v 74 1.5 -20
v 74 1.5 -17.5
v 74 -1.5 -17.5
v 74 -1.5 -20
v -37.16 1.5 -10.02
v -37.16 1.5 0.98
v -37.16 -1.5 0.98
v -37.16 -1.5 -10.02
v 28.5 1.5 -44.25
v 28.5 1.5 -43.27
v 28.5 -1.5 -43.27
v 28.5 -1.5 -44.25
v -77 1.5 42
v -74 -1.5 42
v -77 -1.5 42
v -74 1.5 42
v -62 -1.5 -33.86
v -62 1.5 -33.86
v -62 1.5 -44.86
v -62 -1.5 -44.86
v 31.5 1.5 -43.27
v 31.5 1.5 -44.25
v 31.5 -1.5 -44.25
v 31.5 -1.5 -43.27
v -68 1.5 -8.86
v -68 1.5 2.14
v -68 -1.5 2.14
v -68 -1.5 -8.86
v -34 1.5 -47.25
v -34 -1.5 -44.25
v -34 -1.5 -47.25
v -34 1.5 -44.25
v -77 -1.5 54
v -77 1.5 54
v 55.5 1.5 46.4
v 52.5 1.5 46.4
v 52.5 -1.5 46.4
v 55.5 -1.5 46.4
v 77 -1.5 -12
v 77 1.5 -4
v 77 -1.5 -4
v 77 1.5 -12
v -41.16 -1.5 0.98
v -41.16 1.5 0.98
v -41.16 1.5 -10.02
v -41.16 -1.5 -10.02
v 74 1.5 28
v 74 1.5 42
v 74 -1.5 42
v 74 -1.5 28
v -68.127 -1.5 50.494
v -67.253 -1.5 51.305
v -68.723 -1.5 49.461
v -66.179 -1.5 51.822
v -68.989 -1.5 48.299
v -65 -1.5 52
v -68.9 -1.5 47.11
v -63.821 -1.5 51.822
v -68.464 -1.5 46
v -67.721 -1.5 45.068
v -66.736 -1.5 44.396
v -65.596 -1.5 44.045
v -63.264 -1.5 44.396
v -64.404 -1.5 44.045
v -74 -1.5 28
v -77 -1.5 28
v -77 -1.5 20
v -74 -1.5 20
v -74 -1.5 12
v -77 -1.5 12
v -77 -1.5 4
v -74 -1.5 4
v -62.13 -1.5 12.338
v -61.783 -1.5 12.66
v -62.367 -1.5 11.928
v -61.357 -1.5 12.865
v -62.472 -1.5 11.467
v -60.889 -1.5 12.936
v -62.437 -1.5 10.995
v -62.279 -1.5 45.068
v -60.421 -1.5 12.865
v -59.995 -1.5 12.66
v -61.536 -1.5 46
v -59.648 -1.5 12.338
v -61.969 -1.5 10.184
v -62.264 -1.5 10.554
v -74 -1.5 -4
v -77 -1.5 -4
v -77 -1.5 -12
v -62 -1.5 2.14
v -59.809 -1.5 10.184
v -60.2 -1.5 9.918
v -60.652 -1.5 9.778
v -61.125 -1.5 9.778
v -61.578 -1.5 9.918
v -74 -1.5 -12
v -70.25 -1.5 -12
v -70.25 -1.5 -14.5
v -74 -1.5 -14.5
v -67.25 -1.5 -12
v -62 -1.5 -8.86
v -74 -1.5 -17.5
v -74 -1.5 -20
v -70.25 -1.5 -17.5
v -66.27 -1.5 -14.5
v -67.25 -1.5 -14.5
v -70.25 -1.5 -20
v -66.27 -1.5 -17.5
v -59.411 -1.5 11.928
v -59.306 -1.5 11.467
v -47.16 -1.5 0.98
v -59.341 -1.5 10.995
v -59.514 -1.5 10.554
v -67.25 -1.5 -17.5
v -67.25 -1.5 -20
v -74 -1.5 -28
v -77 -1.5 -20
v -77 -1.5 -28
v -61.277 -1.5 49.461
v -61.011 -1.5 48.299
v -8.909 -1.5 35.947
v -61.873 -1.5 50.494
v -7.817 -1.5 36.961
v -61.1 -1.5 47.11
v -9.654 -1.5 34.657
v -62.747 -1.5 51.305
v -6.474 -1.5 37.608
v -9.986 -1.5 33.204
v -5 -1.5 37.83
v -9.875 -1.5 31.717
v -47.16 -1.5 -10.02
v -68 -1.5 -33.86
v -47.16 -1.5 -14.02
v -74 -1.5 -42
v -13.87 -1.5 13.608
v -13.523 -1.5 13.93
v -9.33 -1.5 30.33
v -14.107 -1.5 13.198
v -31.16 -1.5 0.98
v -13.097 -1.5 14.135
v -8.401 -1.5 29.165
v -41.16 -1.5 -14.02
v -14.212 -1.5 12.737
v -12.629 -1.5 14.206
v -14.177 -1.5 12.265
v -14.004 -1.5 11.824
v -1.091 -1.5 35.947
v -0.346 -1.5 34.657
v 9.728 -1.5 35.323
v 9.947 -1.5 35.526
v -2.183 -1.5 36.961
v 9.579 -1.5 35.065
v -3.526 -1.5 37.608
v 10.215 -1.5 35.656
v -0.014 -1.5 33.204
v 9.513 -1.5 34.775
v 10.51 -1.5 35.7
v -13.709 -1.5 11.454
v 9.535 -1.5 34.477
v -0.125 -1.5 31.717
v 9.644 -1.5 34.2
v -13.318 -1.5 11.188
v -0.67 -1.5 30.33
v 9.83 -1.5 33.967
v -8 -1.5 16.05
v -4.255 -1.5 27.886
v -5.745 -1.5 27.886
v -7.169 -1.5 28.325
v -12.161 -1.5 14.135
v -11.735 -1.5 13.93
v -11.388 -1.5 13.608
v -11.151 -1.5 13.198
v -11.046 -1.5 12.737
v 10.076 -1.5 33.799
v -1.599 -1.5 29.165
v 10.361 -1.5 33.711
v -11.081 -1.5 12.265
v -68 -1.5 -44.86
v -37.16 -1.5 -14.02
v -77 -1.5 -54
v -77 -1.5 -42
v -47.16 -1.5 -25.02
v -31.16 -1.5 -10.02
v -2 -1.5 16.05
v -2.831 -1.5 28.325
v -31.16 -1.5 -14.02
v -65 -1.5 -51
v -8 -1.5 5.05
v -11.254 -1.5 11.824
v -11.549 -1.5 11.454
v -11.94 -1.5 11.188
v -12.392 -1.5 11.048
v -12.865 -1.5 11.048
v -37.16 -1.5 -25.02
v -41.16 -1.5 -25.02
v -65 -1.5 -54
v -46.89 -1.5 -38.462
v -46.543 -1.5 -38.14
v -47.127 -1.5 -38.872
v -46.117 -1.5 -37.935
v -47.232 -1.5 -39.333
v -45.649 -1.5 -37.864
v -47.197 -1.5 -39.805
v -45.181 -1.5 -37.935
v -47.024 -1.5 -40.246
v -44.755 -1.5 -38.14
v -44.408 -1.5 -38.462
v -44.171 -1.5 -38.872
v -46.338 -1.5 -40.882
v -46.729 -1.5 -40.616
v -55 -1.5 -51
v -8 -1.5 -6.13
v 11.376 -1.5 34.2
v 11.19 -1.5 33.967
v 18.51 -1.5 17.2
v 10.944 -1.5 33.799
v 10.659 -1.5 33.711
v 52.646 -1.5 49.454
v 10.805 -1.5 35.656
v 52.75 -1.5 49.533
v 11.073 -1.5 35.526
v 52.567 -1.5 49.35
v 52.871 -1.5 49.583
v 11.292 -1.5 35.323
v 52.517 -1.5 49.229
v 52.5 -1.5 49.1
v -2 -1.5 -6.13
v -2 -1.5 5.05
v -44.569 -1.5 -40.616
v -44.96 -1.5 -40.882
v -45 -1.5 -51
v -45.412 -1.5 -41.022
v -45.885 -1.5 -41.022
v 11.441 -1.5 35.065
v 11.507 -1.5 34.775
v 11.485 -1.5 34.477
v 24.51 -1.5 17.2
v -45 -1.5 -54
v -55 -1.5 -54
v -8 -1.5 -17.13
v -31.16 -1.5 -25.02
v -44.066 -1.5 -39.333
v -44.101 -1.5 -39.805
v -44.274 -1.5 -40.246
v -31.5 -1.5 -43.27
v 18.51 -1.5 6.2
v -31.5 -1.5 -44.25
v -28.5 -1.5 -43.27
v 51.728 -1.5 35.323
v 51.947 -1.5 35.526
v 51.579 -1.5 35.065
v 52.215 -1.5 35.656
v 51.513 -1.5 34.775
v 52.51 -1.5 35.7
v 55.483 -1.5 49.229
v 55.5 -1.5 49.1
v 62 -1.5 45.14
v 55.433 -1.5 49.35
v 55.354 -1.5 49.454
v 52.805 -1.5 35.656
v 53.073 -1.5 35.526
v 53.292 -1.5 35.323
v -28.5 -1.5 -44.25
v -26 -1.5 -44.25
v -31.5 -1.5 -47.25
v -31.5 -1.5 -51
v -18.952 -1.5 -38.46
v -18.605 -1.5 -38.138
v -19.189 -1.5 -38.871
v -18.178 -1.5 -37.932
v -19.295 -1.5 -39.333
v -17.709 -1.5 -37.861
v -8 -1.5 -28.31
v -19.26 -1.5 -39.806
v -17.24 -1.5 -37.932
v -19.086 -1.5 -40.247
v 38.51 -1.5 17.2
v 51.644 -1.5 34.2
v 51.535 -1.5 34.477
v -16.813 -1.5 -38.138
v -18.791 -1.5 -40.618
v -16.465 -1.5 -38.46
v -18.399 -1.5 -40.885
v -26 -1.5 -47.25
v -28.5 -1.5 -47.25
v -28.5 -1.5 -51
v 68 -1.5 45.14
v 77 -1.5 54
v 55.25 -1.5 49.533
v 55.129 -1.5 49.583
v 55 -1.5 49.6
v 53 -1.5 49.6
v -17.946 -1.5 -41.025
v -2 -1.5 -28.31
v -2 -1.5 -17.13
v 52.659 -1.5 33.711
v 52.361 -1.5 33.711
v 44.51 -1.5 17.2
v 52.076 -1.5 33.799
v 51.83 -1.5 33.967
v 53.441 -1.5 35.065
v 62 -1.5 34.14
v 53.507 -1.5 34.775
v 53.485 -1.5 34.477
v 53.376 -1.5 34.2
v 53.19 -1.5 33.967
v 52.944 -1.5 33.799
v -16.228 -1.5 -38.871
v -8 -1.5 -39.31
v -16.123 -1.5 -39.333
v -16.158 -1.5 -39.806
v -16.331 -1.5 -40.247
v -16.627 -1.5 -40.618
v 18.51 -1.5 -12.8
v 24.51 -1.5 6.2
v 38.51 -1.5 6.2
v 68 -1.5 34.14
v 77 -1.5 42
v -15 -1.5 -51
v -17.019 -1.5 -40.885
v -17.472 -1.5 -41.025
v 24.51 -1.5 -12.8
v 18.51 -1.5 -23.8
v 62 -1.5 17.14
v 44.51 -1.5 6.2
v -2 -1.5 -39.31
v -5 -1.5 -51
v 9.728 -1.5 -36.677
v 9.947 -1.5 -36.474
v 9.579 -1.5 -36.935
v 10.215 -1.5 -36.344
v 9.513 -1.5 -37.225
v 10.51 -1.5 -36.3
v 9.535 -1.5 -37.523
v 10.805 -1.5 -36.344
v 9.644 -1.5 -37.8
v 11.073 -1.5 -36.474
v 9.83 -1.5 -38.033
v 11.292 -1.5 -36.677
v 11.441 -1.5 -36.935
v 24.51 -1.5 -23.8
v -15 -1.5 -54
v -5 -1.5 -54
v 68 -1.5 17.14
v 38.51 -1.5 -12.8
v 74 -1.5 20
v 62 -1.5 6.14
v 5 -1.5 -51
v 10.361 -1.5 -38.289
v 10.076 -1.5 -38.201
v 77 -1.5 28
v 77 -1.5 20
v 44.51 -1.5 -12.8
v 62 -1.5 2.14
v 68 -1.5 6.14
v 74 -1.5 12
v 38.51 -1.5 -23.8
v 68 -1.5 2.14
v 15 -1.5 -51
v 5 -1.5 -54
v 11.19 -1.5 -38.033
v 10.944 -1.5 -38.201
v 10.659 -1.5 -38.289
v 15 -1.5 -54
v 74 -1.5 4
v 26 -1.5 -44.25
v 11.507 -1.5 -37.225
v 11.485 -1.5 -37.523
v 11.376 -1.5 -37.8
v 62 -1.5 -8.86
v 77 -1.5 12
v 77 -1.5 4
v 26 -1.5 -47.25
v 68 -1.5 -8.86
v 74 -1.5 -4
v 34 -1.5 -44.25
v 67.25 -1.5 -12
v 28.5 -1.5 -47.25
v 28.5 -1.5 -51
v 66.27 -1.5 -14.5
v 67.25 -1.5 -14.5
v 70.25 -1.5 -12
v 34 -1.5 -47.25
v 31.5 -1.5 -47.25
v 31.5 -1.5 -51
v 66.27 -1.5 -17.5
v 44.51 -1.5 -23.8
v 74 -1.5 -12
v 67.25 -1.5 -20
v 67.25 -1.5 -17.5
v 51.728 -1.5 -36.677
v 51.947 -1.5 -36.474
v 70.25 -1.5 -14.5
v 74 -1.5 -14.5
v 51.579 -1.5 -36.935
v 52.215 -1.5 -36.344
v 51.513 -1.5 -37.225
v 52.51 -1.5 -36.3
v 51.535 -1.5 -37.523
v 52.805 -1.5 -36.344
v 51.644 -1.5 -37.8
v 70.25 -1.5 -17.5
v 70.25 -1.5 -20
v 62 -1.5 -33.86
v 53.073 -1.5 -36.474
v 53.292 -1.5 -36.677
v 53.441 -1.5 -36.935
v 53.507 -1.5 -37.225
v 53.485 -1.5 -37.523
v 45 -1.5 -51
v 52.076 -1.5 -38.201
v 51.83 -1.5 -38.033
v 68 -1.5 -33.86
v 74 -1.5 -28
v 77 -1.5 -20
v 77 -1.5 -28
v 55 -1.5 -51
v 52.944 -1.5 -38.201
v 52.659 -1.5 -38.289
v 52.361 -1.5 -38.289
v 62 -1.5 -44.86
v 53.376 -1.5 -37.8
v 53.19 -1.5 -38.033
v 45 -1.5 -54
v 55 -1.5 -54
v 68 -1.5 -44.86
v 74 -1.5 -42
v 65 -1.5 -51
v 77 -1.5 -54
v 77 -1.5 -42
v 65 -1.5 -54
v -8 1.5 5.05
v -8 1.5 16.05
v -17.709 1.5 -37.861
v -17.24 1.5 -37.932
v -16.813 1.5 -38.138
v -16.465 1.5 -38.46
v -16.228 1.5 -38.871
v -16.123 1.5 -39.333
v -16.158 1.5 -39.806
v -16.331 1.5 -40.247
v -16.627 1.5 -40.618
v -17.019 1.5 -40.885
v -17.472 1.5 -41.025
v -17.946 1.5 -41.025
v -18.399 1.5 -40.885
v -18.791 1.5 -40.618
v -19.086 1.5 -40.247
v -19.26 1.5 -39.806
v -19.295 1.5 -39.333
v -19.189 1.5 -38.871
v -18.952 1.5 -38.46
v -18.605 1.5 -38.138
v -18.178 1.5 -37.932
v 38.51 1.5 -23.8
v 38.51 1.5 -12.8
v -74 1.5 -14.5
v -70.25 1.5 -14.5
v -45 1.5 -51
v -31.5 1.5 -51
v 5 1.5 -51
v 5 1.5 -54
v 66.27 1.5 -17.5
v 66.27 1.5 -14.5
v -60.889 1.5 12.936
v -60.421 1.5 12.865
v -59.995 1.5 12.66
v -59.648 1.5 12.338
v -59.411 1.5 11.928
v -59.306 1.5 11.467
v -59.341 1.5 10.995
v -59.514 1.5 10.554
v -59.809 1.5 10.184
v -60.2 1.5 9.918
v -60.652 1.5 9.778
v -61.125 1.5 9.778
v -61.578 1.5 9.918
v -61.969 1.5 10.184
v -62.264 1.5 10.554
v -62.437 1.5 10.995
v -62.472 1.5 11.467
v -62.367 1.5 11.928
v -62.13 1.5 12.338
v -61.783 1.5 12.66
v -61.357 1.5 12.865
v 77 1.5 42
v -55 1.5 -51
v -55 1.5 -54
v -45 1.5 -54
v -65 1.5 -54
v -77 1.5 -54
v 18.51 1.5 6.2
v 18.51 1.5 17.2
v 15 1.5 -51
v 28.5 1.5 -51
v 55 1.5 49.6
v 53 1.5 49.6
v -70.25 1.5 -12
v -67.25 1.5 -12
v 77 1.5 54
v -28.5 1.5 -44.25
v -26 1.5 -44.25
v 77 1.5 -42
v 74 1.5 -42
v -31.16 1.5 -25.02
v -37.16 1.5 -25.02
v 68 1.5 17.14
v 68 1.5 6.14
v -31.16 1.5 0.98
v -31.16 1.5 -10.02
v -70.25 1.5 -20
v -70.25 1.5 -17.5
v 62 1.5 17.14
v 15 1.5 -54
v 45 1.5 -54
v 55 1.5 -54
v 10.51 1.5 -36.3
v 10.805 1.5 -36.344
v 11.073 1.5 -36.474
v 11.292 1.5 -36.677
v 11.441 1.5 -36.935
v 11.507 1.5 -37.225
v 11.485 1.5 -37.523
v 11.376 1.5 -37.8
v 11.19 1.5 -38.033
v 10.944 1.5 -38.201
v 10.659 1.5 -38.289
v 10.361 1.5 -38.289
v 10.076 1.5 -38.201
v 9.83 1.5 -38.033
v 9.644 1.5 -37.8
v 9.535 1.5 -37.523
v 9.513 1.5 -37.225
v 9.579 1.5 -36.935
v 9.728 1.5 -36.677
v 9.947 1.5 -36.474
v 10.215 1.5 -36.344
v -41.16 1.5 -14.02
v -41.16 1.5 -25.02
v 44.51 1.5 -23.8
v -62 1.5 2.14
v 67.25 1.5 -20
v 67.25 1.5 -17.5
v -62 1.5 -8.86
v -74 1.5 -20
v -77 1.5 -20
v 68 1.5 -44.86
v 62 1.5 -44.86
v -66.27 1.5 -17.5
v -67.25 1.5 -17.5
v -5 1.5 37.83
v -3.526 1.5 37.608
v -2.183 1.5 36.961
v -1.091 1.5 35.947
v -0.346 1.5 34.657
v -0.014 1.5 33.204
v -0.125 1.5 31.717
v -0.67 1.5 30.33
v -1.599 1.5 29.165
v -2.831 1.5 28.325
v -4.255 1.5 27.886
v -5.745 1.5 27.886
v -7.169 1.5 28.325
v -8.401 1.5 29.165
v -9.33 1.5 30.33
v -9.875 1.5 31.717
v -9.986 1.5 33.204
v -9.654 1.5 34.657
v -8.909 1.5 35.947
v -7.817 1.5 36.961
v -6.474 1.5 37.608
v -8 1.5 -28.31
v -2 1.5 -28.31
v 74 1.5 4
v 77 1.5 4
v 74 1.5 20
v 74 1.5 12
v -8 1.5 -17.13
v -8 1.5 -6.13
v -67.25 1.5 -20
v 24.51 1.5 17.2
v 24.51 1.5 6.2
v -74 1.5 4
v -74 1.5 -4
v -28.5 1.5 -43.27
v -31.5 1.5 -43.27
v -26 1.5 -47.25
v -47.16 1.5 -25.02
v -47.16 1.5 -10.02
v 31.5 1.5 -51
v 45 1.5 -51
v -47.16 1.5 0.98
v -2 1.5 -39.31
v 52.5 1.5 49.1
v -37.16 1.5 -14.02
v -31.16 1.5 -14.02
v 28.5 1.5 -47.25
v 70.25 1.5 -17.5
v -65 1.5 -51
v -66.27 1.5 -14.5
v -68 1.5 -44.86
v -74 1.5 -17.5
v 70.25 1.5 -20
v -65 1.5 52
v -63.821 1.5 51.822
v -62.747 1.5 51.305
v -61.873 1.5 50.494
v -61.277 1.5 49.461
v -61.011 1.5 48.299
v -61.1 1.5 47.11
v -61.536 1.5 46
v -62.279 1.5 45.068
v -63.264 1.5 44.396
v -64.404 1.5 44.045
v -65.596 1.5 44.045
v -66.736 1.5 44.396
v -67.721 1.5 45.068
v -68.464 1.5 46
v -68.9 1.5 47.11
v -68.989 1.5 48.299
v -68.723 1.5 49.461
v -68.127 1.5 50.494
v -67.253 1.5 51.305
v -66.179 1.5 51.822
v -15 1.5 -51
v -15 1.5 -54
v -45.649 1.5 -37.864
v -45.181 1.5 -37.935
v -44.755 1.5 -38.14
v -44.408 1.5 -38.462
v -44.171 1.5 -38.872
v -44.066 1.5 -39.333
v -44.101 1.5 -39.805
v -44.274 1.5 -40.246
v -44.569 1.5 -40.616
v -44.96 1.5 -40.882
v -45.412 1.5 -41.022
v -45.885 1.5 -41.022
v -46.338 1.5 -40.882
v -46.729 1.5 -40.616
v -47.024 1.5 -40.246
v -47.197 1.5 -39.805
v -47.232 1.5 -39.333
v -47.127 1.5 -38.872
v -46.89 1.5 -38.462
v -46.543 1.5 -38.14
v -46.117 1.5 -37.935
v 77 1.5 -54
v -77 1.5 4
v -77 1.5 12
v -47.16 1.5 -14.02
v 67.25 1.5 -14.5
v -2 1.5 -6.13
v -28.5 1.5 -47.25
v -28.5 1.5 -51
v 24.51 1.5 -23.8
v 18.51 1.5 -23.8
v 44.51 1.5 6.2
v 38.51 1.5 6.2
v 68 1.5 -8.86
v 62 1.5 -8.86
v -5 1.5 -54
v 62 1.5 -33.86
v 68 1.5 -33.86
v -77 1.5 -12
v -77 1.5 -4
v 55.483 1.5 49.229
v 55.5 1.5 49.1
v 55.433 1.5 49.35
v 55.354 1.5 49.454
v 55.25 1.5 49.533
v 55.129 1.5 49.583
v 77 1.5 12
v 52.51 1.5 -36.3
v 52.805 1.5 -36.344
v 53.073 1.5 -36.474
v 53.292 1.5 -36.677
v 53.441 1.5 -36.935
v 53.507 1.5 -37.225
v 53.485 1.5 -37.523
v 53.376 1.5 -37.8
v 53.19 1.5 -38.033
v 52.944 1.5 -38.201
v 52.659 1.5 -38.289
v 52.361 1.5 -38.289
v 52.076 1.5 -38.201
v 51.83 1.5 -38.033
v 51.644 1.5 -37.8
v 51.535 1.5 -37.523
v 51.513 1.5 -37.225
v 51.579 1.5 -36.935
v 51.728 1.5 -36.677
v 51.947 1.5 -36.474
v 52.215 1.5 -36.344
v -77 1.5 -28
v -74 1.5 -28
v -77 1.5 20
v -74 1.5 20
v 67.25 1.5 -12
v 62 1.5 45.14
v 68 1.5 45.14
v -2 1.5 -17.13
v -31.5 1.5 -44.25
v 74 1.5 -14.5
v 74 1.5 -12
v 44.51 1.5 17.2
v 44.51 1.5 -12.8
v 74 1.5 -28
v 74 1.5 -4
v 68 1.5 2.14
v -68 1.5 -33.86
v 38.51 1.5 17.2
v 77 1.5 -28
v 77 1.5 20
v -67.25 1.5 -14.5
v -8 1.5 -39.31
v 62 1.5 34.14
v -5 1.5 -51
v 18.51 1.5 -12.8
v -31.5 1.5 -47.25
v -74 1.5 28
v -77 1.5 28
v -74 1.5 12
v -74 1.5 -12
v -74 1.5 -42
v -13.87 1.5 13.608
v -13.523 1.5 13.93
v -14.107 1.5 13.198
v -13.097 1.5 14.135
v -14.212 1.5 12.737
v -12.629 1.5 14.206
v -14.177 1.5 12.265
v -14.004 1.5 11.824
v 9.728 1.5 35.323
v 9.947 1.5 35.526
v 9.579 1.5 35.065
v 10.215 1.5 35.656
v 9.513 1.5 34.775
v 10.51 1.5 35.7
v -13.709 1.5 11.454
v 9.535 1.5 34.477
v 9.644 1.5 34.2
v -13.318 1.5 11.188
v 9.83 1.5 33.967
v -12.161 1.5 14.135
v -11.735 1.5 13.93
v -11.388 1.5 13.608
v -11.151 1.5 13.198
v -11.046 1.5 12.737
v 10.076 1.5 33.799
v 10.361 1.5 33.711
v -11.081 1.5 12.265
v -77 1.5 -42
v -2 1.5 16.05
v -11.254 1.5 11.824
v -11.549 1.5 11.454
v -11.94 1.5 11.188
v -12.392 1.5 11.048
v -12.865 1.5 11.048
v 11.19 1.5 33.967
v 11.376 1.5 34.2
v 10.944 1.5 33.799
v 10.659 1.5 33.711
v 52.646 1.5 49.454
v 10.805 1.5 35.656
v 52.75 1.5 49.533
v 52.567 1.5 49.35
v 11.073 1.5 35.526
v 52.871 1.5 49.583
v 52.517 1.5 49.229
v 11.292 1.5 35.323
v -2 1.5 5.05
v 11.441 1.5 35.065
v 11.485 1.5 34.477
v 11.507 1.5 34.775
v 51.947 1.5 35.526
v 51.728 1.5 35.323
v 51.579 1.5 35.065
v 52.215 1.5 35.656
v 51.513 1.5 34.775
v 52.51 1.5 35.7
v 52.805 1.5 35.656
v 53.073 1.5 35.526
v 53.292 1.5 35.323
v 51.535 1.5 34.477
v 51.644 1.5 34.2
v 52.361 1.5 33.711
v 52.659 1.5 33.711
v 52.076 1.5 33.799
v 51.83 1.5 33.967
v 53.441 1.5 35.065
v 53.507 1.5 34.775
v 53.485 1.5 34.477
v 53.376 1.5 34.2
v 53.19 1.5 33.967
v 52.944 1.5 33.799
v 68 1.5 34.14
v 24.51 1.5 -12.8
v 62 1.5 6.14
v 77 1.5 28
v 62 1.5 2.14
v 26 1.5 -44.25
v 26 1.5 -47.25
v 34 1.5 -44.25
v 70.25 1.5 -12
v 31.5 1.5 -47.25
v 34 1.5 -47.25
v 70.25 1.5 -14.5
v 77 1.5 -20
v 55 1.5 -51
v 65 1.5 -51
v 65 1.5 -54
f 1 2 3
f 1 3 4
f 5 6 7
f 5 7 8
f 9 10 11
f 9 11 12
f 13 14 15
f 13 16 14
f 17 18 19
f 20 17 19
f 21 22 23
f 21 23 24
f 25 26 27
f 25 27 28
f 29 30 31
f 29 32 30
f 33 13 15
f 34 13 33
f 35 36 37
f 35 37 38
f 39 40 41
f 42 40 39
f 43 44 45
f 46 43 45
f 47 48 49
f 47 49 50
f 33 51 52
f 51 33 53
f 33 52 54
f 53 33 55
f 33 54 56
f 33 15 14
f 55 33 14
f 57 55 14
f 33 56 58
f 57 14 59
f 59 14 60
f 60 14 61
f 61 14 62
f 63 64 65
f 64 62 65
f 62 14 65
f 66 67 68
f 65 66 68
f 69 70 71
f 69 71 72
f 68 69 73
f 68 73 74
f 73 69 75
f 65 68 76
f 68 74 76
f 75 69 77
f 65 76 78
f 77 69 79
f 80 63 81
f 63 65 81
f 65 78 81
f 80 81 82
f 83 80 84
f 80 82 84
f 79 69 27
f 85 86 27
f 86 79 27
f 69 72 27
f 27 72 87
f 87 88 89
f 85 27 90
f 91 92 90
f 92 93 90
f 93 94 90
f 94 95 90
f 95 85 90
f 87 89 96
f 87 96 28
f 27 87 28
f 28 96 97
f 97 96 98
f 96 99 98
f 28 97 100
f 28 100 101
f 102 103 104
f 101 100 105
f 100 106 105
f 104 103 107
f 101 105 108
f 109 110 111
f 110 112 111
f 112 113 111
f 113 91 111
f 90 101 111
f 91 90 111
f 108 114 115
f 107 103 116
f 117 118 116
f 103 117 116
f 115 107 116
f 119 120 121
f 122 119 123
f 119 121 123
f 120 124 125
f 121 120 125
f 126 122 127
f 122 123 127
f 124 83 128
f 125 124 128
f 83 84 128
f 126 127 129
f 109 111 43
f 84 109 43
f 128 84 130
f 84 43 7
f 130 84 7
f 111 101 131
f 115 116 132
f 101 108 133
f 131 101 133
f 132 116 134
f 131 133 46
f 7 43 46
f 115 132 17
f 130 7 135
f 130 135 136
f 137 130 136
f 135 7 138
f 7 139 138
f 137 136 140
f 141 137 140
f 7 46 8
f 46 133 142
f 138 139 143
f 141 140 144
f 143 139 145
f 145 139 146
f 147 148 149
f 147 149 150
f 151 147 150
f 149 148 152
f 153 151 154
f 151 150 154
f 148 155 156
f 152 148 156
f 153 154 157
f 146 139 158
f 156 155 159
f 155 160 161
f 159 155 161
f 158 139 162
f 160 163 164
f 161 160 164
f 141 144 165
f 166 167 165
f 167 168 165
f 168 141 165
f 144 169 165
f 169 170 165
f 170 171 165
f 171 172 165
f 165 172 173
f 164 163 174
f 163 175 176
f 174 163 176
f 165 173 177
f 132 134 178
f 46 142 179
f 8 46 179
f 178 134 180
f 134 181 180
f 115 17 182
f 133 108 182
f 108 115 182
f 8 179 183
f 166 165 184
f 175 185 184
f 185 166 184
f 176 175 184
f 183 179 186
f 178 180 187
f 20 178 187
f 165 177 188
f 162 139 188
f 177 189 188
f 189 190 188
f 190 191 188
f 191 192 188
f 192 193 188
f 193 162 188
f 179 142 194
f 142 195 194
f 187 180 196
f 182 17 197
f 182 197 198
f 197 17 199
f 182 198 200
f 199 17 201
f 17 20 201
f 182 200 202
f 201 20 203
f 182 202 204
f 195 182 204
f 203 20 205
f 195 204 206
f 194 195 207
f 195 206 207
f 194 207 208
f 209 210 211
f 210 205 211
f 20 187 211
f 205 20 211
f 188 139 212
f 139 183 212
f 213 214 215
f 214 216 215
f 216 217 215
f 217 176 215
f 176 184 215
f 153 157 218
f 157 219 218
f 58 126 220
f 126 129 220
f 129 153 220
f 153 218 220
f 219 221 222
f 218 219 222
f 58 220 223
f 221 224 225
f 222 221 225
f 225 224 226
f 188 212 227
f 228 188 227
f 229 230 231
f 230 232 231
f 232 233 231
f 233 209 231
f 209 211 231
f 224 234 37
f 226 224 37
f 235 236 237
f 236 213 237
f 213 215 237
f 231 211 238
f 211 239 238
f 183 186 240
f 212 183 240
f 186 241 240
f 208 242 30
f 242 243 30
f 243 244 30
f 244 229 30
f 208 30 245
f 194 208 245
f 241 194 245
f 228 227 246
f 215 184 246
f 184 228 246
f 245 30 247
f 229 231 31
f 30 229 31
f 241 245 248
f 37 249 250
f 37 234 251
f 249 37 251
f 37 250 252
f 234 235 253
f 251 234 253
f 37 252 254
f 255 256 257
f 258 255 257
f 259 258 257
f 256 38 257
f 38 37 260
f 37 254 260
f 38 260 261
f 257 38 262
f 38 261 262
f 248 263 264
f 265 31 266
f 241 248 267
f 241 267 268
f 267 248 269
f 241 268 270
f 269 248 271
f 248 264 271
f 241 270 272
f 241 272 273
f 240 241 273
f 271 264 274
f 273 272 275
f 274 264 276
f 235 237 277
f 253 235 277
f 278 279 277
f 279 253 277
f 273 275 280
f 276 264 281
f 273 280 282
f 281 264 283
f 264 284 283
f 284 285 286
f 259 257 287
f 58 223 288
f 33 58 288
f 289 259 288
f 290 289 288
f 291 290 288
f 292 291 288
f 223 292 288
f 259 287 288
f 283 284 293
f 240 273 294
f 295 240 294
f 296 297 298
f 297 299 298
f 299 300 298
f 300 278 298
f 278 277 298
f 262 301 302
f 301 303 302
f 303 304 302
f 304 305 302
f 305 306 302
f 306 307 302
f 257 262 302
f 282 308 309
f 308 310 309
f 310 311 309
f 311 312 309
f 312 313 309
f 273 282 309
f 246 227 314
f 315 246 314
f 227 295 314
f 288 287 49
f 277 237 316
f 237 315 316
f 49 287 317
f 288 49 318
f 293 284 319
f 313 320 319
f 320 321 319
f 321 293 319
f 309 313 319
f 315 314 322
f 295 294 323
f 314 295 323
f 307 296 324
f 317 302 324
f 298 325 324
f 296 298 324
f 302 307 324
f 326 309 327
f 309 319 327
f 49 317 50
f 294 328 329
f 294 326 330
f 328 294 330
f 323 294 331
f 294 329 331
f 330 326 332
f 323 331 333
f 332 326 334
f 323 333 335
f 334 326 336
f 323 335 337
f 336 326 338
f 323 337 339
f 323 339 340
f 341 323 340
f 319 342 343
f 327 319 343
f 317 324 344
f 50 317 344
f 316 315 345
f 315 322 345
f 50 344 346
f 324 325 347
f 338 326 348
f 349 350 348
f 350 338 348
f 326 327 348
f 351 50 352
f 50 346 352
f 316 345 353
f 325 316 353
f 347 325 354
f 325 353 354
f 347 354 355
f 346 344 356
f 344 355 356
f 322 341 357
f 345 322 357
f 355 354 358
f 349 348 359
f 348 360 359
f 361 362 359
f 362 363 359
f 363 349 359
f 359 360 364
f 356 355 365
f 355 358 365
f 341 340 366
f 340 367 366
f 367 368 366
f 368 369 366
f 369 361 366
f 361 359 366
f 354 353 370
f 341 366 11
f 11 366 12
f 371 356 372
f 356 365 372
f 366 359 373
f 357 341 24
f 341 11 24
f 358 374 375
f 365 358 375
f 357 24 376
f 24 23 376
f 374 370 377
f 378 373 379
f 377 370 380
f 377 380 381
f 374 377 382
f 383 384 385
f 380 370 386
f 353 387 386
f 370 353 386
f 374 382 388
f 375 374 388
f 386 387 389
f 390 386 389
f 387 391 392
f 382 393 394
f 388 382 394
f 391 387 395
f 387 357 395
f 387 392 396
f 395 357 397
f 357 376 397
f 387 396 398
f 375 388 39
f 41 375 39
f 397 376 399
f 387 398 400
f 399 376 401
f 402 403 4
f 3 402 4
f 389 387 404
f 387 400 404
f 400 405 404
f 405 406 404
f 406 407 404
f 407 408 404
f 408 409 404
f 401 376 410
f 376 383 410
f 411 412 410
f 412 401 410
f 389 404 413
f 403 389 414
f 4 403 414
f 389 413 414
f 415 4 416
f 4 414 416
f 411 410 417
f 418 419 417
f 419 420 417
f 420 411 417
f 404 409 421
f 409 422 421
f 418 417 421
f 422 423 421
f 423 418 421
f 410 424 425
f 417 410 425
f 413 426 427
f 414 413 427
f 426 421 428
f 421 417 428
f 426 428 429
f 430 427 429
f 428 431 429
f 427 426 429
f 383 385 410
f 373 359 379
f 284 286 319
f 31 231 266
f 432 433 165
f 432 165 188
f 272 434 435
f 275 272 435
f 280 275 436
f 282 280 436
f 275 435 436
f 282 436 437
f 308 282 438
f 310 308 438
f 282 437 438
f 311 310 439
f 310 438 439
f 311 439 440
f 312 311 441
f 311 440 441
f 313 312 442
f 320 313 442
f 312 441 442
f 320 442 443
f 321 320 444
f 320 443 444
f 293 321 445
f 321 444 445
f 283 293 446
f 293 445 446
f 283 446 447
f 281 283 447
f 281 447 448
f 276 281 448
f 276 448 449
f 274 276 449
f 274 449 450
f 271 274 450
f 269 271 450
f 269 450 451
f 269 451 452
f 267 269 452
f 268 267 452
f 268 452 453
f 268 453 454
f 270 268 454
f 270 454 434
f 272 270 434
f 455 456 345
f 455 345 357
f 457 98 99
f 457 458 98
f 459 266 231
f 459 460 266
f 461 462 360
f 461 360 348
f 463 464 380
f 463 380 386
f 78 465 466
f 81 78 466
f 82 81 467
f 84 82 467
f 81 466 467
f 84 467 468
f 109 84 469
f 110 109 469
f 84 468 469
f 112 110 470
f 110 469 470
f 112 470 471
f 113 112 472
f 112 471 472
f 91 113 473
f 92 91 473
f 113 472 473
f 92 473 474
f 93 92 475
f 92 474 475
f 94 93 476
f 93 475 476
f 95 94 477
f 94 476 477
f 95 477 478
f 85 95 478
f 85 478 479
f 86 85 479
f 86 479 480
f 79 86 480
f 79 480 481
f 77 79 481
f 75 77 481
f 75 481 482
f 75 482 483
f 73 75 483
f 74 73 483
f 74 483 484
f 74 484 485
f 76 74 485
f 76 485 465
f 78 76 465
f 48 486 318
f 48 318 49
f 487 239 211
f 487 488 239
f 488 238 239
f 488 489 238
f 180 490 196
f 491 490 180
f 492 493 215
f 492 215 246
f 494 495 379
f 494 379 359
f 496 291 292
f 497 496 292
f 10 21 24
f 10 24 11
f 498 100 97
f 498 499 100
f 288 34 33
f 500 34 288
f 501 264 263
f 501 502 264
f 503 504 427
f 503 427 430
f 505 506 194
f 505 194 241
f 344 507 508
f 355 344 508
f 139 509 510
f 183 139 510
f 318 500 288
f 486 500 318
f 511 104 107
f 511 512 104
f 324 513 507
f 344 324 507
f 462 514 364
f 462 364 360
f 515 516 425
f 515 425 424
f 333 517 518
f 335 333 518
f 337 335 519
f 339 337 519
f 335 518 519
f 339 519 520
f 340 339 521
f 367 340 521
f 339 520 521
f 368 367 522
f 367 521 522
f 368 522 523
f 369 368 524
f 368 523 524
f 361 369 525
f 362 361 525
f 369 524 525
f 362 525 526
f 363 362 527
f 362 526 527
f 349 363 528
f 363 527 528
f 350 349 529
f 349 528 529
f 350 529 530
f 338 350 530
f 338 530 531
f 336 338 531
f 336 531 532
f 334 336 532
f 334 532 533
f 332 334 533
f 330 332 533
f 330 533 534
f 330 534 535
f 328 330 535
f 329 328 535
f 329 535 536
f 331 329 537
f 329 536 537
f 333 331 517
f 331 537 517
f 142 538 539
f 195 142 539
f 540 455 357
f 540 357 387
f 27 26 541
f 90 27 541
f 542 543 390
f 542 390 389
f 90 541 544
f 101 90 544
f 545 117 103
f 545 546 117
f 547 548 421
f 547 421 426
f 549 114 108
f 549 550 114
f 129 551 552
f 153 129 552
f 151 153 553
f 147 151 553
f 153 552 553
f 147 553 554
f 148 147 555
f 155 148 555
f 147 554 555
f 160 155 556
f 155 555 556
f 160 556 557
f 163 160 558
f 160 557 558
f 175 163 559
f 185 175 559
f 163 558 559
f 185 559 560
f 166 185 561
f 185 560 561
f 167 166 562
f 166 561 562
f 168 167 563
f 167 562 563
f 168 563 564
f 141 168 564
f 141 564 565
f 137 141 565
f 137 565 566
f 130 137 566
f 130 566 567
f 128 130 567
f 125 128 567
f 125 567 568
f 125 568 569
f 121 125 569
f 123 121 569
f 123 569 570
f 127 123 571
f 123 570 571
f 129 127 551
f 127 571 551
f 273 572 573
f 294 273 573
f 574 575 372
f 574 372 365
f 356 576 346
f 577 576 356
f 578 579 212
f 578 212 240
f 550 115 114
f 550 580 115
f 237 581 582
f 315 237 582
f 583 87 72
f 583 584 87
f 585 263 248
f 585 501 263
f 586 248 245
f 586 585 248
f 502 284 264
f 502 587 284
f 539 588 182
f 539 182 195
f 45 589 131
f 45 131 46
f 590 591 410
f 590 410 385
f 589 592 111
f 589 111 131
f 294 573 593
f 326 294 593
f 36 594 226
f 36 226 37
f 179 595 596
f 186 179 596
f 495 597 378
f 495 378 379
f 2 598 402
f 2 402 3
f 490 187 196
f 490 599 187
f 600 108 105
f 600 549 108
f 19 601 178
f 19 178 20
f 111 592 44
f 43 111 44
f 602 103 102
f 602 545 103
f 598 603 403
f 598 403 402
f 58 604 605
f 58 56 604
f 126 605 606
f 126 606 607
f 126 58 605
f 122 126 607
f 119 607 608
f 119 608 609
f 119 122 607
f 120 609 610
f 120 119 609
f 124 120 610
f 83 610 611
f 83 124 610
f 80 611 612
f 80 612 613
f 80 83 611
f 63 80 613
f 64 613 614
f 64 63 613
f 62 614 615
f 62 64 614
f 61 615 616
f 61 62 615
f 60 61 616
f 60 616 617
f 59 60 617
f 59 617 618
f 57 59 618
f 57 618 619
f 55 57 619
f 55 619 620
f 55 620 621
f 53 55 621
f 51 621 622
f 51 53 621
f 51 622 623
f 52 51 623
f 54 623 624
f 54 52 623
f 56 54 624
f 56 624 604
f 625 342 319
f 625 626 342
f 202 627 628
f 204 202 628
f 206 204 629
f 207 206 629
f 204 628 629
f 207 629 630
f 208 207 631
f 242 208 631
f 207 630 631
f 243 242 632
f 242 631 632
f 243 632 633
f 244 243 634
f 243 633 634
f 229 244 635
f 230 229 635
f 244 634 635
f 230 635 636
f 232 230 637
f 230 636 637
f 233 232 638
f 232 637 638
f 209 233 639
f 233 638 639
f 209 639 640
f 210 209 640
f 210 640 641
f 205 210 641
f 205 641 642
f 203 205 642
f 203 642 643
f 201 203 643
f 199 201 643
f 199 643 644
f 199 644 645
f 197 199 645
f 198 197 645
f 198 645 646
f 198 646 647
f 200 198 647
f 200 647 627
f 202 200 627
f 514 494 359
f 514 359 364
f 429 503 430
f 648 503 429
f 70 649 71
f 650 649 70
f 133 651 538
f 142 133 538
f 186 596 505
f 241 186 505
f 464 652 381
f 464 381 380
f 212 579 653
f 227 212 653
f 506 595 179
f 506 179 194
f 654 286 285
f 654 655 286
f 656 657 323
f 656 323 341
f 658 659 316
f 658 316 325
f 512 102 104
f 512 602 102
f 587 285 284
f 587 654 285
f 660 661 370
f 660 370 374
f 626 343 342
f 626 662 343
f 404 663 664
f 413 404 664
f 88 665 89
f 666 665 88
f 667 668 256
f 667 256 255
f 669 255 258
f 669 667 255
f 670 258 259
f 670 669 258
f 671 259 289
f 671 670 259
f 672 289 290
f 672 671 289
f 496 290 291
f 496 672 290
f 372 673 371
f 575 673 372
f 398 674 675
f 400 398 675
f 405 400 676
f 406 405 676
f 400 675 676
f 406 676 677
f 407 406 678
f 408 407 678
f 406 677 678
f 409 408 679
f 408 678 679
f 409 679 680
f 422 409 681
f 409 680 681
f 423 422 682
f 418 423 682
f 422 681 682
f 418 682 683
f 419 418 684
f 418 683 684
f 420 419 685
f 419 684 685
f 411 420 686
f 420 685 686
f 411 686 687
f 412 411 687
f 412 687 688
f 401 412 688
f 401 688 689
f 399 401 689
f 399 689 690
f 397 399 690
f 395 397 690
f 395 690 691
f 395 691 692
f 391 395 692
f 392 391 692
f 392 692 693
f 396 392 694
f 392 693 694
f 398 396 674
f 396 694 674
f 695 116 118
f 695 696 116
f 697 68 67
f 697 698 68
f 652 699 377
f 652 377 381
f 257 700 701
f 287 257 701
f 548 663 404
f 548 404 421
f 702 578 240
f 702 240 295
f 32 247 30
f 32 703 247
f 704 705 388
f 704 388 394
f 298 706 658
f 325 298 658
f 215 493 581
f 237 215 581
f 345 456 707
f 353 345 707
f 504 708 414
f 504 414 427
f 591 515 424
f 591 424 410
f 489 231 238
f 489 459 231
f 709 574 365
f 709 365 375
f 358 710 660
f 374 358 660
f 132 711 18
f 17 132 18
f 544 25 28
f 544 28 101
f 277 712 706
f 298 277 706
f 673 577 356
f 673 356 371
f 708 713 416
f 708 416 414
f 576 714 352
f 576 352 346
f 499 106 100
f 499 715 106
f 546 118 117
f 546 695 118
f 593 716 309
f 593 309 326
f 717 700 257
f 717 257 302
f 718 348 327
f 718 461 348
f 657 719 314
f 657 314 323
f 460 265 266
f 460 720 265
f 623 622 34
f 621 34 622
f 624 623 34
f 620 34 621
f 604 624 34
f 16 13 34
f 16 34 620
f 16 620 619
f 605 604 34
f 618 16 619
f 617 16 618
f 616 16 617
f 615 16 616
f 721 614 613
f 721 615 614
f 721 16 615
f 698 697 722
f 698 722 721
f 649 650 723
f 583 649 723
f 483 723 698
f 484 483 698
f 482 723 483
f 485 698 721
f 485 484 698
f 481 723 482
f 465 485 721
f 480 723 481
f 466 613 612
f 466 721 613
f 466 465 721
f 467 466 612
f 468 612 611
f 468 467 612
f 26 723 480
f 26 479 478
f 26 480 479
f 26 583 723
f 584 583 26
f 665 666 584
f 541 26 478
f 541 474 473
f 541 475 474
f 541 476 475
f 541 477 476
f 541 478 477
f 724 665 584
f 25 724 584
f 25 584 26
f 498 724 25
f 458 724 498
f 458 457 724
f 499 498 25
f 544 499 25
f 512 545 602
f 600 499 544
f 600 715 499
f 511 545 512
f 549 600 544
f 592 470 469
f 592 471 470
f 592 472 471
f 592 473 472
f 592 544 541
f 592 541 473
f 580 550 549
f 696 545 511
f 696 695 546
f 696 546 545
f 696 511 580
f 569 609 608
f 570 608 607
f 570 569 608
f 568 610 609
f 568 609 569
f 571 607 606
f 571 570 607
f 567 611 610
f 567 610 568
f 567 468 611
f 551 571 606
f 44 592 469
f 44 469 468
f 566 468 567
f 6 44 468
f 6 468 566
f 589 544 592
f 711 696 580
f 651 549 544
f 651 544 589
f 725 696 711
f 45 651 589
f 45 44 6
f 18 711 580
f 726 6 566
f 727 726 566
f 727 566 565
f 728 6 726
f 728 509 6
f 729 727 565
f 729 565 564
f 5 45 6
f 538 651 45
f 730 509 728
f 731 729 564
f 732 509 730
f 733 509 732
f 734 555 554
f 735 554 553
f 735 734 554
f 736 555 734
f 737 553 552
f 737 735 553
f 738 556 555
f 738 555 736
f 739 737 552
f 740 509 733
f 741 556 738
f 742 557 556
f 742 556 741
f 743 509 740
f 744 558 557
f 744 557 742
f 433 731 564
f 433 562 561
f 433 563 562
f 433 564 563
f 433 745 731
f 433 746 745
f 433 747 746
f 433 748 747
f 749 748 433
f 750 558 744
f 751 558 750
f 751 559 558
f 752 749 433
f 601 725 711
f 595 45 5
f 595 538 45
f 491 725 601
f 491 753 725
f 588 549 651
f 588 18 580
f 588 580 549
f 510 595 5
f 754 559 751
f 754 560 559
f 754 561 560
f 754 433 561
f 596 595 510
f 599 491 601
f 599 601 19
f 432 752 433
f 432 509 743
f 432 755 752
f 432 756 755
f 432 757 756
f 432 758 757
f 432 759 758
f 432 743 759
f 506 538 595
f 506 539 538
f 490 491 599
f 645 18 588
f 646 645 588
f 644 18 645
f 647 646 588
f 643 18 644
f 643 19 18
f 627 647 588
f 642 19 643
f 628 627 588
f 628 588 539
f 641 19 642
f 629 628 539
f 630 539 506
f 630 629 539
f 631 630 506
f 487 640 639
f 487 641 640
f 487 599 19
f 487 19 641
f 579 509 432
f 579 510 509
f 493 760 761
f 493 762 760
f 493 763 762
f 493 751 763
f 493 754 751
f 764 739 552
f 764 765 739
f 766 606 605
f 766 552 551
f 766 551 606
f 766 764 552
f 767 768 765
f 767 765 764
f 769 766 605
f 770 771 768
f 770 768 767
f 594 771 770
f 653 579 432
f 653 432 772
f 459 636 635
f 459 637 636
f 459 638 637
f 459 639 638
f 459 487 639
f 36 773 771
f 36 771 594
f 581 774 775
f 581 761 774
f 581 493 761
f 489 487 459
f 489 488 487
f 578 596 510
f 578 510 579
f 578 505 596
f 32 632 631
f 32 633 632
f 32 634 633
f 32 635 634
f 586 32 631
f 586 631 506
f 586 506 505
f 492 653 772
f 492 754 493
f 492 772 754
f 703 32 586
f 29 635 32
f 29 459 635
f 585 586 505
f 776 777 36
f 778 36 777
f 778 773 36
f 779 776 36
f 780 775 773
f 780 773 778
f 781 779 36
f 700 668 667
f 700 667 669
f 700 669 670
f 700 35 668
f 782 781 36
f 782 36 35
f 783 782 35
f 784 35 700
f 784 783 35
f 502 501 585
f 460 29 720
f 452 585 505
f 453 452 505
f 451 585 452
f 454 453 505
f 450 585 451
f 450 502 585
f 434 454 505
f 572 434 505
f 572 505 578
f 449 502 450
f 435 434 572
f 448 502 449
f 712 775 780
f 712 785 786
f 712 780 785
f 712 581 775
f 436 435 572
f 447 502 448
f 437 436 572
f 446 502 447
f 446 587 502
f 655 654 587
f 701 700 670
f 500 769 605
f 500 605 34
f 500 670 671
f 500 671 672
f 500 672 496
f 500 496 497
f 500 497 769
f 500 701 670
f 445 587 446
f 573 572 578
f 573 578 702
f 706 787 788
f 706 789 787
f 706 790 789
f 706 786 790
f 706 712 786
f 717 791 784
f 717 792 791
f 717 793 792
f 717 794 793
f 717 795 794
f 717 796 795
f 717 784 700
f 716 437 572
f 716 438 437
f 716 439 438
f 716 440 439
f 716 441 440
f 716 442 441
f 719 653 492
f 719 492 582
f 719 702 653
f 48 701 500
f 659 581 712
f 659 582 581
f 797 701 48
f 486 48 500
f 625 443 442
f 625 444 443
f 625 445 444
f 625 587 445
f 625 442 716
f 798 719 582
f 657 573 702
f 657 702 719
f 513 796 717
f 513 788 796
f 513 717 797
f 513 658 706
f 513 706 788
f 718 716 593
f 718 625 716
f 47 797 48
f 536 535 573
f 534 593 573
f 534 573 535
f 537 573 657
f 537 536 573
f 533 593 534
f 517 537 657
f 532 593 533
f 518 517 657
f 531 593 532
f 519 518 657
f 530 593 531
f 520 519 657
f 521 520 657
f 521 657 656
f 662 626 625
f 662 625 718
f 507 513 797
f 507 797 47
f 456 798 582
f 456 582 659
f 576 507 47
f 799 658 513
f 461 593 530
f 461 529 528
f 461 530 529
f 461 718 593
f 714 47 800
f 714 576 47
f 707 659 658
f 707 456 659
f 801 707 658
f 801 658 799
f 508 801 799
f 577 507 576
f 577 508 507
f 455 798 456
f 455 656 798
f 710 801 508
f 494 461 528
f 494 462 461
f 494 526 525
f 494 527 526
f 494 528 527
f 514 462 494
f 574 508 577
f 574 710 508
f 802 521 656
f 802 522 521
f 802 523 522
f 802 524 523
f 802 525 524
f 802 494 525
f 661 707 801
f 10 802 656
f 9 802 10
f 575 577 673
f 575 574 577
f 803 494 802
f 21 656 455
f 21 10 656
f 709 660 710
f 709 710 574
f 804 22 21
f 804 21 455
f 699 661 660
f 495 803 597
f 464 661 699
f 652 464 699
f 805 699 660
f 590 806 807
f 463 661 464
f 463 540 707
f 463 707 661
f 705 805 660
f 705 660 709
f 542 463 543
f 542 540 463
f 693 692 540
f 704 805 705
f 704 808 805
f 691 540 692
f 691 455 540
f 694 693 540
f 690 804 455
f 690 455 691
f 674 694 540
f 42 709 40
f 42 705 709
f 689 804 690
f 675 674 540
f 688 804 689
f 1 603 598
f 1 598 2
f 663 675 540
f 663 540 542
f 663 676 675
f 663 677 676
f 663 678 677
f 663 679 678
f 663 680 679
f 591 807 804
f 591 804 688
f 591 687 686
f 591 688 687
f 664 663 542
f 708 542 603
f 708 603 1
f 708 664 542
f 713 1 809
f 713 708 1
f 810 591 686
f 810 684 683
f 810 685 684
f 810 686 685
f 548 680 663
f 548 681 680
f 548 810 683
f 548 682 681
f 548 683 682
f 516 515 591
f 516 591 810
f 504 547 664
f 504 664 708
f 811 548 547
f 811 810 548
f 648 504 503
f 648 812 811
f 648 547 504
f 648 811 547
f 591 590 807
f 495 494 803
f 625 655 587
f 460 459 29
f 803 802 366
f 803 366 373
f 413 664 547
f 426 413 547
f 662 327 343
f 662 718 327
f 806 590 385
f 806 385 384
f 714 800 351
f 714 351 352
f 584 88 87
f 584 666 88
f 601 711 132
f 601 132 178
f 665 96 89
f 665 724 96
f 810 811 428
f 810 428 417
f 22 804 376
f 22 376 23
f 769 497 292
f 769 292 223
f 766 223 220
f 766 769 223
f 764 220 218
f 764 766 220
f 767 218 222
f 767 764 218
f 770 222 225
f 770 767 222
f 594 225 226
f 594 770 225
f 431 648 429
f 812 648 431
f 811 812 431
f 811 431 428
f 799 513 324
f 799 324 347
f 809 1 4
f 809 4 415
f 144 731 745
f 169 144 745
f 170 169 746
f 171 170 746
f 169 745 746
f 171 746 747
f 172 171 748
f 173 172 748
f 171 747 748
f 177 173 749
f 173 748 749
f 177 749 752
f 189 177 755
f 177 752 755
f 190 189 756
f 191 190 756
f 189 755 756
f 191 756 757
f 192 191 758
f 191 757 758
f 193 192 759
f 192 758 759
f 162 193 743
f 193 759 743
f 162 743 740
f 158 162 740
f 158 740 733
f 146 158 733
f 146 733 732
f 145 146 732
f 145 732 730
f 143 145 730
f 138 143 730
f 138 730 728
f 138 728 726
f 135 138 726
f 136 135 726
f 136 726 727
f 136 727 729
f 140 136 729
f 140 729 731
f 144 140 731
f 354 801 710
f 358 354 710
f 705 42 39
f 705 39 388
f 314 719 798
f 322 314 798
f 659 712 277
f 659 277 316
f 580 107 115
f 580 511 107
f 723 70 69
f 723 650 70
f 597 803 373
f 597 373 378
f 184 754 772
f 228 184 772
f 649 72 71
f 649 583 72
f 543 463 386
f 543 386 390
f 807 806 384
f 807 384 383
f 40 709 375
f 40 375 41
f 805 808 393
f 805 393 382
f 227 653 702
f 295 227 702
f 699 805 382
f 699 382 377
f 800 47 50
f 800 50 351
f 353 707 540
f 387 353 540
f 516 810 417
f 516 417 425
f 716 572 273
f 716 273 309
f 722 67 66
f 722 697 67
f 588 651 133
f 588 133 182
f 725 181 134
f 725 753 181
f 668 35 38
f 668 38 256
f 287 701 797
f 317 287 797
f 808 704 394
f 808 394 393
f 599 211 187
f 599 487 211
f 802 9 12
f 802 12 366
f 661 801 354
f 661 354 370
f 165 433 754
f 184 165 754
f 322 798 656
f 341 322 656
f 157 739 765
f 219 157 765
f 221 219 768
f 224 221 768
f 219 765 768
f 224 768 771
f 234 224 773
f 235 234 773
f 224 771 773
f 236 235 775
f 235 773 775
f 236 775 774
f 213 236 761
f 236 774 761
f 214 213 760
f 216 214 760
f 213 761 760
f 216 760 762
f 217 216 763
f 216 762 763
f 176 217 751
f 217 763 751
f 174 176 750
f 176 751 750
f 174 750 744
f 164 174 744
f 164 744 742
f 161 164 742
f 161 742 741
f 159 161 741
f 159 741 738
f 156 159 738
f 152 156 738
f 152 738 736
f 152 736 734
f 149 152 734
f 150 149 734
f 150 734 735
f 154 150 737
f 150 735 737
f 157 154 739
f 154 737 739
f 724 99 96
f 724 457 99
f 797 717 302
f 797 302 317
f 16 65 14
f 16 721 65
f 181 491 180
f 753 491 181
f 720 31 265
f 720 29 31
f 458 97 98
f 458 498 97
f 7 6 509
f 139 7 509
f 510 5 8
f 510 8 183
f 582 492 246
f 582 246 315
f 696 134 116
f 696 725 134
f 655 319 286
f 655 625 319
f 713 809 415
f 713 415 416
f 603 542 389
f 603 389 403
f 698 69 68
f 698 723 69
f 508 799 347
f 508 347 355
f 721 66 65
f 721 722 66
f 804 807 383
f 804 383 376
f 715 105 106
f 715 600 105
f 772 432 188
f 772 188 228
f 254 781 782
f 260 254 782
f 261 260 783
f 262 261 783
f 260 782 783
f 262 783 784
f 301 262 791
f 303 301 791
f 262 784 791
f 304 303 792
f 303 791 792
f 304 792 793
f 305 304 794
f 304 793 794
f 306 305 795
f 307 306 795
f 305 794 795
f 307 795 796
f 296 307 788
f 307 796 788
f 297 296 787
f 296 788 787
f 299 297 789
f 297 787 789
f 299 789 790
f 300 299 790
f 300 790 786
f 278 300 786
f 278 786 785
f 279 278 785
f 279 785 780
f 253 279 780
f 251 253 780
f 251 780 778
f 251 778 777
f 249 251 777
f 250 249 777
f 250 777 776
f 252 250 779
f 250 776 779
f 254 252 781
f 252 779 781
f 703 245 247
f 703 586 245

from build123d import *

# Parameters (mm, degrees)
CROQUIS1_R              = 4
SALIENTE_EXTRUIR1_DEPTH = 1.5
CROQUIS2_R              = 5
CROQUIS2_R_2            = 1
CROQUIS2_W              = 6
CROQUIS2_H              = 11
CORTAR_EXTRUIR1_DEPTH   = 3
CROQUIS3_R              = 1.5875
CROQUIS3_R_2            = 1.590536349
CORTAR_EXTRUIR2_DEPTH   = 23


with BuildPart() as part:
    # Croquis1 → Saliente-Extruir1 (new, symmetric)
    with BuildSketch(Plane(origin=(0, 0, 0), x_dir=(1, 0, 0), z_dir=(0, 1, 0))):
        Polygon((-77, -42), (-77, -54), (77, -54), (77, -42), (74, -42), (74, -28), (77, -28), (77, -20), (74, -20), (74, -12), (77, -12), (77, -4), (74, -4), (74, -1.5), (74, 1.5), (74, 4), (77, 4), (77, 12), (74, 12), (74, 14.5), (70.25, 14.5), (70.25, 12), (67.25, 12), (67.25, 14.5), (66.27, 14.5), (66.27, 17.5), (67.25, 17.5), (67.25, 20), (70.25, 20), (70.25, 17.5), (74, 17.5), (74, 20), (77, 20), (77, 28), (74, 28), (74, 42), (77, 42), (77, 54), (65, 54), (65, 51), (55, 51), (55, 54), (45, 54), (45, 51), (31.5, 51), (31.5, 47.25), (34, 47.25), (34, 44.25), (31.5, 44.25), (31.5, 43.27), (28.5, 43.27), (28.5, 44.25), (26, 44.25), (26, 47.25), (28.5, 47.25), (28.5, 51), (15, 51), (15, 54), (5, 54), (5, 51), (-5, 51), (-5, 54), (-15, 54), (-15, 51), (-28.5, 51), (-28.5, 47.25), (-26, 47.25), (-26, 44.25), (-28.5, 44.25), (-28.5, 43.27), (-31.5, 43.27), (-31.5, 44.25), (-34, 44.25), (-34, 47.25), (-31.5, 47.25), (-31.5, 51), (-45, 51), (-45, 54), (-55, 54), (-55, 51), (-65, 51), (-65, 54), (-77, 54), (-77, 42), (-74, 42), (-74, 28), (-77, 28), (-77, 20), (-74, 20), (-74, 17.5), (-70.25, 17.5), (-70.25, 20), (-67.25, 20), (-67.25, 17.5), (-66.27, 17.5), (-66.27, 14.5), (-67.25, 14.5), (-67.25, 12), (-70.25, 12), (-70.25, 14.5), (-74, 14.5), (-74, 12), (-77, 12), (-77, 4), (-74, 4), (-74, 1.5), (-74, -1.5), (-74, -4), (-77, -4), (-77, -12), (-74, -12), (-74, -20), (-77, -20), (-77, -28), (-74, -28), (-74, -42), align=None)
        with Locations(Location((-65, -48, 0), (0, 0, 270))):
            Circle(CROQUIS1_R, mode=Mode.SUBTRACT)
        with BuildLine():
            Line((55, -49.6), (53, -49.6))
            ThreePointArc((53, -49.6), (52.646446609, -49.453553391), (52.5, -49.1))
            Line((52.5, -49.1), (52.5, -46.4))
            Line((52.5, -46.4), (55.5, -46.4))
            Line((55.5, -46.4), (55.5, -49.1))
            ThreePointArc((55.5, -49.1), (55.353553391, -49.453553391), (55, -49.6))
        make_face(mode=Mode.SUBTRACT)
    extrude(amount=SALIENTE_EXTRUIR1_DEPTH, both=True)

    # Croquis2 → Cortar-Extruir1 (cut)
    with BuildSketch(Plane(origin=(0, 1.5, 0), x_dir=(1, 0, 0), z_dir=(0, 1, 0))):
        with Locations(Location((-5, -32.83, 0), (0, 0, 270))):
            Circle(CROQUIS2_R)
        with Locations(Location((10.51, 37.3, 0), (0, 0, 270))):
            Circle(CROQUIS2_R_2)
        with Locations(Location((52.51, 37.3, 0), (0, 0, 270))):
            Circle(CROQUIS2_R_2)
        with Locations(Location((52.51, -34.7, 0), (0, 0, 270))):
            Circle(CROQUIS2_R_2)
        with Locations(Location((10.51, -34.7, 0), (0, 0, 270))):
            Circle(CROQUIS2_R_2)
        with Locations((-34.16, 4.52)):
            Rectangle(CROQUIS2_W, CROQUIS2_H)
        with Locations((-5, 33.81)):
            Rectangle(CROQUIS2_W, CROQUIS2_H)
        with Locations((-44.16, 4.52)):
            Rectangle(CROQUIS2_W, CROQUIS2_H)
        with Locations((-44.16, 19.52)):
            Rectangle(CROQUIS2_W, CROQUIS2_H)
        with Locations((-34.16, 19.52)):
            Rectangle(CROQUIS2_W, CROQUIS2_H)
        with Locations((-5, 11.63)):
            Rectangle(CROQUIS2_W, CROQUIS2_H)
        with Locations((-5, -10.55)):
            Rectangle(CROQUIS2_W, CROQUIS2_H)
        with Locations((21.51, 18.3)):
            Rectangle(CROQUIS2_W, CROQUIS2_H)
        with Locations((41.51, 18.3)):
            Rectangle(CROQUIS2_W, CROQUIS2_H)
        with Locations((41.51, -11.7)):
            Rectangle(CROQUIS2_W, CROQUIS2_H)
        with Locations((21.51, -11.7)):
            Rectangle(CROQUIS2_W, CROQUIS2_H)
        with Locations((65, 39.36)):
            Rectangle(CROQUIS2_W, CROQUIS2_H)
        with Locations((65, -11.64)):
            Rectangle(CROQUIS2_W, CROQUIS2_H)
        with Locations((65, -39.64)):
            Rectangle(CROQUIS2_W, CROQUIS2_H)
        with Locations((65, 3.36)):
            Rectangle(CROQUIS2_W, CROQUIS2_H)
        with Locations((-65, 3.36)):
            Rectangle(CROQUIS2_W, CROQUIS2_H)
        with Locations((-65, 39.36)):
            Rectangle(CROQUIS2_W, CROQUIS2_H)
    extrude(amount=-CORTAR_EXTRUIR1_DEPTH, mode=Mode.SUBTRACT)

    # Croquis3 → Cortar-Extruir2 (cut)
    with BuildSketch(Plane(origin=(0, 1.5, 0), x_dir=(1, 0, 0), z_dir=(0, 1, 0))):
        with Locations(Location((-60.888852319, -11.348115731, 0), (0, 0, 270))):
            Circle(CROQUIS3_R)
        with Locations(Location((-12.628852319, -12.618115731, 0), (0, 0, 270))):
            Circle(CROQUIS3_R)
        with Locations(Location((-45.648852319, 39.451884269, 0), (0, 0, 270))):
            Circle(CROQUIS3_R)
        with Locations(Location((-17.708852319, 39.451884269, 0), (0, 0, 270))):
            Circle(CROQUIS3_R_2)
    extrude(amount=-CORTAR_EXTRUIR2_DEPTH, mode=Mode.SUBTRACT)


solid = part.part
